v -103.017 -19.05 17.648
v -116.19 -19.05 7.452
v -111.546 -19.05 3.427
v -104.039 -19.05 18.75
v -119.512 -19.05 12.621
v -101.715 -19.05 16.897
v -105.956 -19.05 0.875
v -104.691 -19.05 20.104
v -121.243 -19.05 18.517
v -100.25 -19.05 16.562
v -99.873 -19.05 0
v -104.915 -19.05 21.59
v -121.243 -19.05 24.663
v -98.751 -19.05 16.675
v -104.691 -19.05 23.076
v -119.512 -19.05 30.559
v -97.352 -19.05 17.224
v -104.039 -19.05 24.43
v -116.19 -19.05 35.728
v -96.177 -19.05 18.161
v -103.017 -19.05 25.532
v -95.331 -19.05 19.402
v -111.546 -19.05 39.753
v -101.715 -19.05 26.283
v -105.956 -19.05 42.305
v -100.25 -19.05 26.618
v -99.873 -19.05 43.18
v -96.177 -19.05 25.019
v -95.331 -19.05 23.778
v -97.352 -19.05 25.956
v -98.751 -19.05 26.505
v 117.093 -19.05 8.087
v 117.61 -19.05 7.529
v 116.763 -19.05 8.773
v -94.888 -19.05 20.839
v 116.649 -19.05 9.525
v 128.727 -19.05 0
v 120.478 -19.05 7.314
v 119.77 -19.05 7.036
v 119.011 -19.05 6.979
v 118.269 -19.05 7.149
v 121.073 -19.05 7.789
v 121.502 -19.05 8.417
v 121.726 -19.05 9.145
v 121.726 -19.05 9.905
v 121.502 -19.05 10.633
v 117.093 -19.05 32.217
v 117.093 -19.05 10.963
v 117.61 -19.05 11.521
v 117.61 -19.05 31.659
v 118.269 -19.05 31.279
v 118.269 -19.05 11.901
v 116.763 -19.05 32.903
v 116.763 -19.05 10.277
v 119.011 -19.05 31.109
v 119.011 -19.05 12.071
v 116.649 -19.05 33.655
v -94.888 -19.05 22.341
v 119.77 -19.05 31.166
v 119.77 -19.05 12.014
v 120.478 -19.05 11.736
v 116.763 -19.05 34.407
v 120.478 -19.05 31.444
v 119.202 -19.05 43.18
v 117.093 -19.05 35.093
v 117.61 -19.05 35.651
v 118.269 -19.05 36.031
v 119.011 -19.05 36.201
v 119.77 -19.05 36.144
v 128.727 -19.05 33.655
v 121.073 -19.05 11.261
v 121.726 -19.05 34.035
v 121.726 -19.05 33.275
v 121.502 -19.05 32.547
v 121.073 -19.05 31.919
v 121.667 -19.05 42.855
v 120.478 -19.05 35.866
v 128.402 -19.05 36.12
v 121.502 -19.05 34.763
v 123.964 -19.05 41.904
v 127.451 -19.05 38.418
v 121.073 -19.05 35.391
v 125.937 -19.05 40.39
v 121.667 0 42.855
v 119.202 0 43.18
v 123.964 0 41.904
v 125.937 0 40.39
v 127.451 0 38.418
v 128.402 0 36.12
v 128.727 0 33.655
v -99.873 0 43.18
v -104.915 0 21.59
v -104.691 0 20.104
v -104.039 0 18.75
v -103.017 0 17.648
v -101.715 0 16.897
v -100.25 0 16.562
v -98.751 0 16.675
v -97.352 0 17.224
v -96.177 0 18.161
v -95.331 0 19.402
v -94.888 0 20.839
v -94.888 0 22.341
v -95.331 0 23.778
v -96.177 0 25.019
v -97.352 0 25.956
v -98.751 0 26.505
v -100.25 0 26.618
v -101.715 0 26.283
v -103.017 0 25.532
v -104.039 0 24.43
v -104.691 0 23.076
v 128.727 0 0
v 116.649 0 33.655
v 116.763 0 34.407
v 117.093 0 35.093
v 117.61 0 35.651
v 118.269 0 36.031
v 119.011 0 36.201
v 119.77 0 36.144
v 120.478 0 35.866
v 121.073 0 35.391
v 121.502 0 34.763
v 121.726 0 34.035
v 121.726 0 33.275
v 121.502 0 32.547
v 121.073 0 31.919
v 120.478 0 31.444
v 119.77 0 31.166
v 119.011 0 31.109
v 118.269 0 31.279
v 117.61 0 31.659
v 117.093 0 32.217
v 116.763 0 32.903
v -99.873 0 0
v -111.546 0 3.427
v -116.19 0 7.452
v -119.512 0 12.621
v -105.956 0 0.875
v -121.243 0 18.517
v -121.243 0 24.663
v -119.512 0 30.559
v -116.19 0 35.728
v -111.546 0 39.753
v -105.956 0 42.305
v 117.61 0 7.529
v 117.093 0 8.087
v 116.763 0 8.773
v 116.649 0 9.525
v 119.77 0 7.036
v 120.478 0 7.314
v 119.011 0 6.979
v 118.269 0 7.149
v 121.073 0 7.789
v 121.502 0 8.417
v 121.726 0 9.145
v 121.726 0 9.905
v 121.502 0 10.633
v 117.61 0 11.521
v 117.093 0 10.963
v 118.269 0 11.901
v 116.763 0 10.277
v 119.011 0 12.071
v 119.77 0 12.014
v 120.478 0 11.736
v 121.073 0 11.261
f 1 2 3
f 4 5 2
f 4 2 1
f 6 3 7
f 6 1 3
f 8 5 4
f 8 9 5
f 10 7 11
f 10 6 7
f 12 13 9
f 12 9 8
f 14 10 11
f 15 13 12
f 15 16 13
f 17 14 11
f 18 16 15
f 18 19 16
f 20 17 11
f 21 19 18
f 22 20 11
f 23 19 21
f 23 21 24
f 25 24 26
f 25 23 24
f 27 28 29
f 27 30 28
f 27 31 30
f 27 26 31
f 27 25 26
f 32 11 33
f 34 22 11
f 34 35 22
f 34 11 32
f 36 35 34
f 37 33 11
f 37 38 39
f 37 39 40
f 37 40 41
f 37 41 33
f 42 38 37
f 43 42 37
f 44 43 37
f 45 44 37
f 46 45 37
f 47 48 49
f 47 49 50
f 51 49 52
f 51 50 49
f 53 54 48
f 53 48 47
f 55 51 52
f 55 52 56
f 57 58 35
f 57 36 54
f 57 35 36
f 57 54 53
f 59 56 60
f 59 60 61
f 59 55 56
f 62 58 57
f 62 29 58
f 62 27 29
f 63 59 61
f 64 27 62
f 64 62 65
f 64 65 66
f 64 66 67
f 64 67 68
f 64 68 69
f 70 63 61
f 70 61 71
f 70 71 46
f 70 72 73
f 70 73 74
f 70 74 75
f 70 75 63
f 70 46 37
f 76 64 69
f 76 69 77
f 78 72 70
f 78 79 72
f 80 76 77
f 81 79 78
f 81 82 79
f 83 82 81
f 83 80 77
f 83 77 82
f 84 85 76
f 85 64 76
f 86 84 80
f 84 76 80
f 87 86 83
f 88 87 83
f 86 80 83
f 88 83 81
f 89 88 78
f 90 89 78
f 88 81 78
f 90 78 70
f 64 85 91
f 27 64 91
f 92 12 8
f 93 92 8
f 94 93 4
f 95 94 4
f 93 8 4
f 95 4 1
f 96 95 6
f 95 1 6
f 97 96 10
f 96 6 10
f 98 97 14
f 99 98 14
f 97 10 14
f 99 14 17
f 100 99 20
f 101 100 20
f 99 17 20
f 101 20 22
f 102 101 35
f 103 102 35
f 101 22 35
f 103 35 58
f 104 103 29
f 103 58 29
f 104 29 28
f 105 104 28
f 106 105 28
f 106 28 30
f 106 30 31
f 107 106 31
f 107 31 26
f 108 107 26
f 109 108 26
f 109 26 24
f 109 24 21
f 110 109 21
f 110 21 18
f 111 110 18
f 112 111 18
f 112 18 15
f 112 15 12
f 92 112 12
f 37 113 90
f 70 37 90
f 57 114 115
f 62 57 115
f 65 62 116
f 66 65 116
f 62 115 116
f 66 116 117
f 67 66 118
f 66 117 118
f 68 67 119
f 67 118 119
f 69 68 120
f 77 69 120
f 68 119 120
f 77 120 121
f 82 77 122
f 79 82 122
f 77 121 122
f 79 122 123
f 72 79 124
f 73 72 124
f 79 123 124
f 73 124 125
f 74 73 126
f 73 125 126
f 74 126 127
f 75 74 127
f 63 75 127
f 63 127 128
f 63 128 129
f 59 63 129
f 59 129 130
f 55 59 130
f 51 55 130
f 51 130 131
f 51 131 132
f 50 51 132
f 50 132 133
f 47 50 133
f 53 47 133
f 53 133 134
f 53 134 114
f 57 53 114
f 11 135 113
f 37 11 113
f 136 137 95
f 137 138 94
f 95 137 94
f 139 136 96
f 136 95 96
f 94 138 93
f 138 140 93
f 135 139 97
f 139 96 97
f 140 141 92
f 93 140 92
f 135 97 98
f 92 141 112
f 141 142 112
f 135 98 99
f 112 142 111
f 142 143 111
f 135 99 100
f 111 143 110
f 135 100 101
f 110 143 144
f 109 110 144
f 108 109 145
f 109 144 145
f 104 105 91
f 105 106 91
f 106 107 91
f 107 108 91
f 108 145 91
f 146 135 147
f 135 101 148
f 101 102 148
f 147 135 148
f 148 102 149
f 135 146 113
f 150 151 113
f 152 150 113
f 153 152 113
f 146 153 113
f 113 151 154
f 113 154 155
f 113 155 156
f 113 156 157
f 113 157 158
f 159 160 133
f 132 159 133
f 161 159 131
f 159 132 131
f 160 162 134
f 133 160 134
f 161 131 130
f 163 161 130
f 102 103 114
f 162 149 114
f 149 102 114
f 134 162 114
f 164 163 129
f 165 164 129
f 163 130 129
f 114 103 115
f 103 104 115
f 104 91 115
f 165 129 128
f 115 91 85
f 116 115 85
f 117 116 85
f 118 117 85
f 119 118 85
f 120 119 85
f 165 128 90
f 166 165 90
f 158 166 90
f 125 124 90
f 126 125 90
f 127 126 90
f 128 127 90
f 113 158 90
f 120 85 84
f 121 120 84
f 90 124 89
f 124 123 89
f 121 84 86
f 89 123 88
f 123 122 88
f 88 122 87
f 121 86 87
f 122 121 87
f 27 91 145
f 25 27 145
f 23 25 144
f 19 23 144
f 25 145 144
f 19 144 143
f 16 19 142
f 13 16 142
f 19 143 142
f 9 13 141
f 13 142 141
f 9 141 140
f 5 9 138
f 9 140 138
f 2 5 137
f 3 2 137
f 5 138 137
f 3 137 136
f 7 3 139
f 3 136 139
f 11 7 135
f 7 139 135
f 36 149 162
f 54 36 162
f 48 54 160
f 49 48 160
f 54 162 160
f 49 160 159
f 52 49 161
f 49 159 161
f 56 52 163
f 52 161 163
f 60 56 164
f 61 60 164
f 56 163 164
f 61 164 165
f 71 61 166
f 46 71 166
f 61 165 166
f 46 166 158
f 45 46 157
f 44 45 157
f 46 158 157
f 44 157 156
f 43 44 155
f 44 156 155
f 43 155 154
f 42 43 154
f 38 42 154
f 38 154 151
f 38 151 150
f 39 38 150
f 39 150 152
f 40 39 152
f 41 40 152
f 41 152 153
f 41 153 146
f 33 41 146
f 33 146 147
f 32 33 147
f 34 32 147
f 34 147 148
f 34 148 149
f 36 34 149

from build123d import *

# Parameters (mm, degrees)
F1_DEPTH = 19.05
F2_D     = 10.0838
F3_R     = 9.525
F5_D     = 5.1054


with BuildPart() as f1:
    # F0 (on Front) → F1 (new body)
    with BuildSketch(Plane.XZ):
        with BuildLine():
            Line((128.7268799004, 43.18), (-99.8731200996, 43.18))
            ThreePointArc((-99.8731200996, 43.18), (-121.4631200996, 21.59), (-99.8731200996, 0))
            Line((-99.8731200996, 0), (128.7268799004, 0))
            Line((128.7268799004, 0), (128.7268799004, 43.18))
        make_face()
    extrude(amount=F1_DEPTH)

    # F2 (through all)
    with Locations(Plane(origin=(0, 0, 0), x_dir=(1, 0, 0), z_dir=(0, 1, 0))):
        with Locations((-99.8731200996, -21.59)):
            Hole(F2_D / 2)

    # F3
    f3_edges = [f1.edges().sort_by_distance(p)[0] for p in [
        (128.72688, -9.525, 43.18),
    ]]
    fillet(f3_edges, radius=F3_R)

    # F5 (through all)
    with Locations(Plane.XZ.offset(19.05)):
        with Locations((119.2018799004, 33.655), (119.2018799004, 9.525)):
            Hole(F5_D / 2)


solid = f1.part
